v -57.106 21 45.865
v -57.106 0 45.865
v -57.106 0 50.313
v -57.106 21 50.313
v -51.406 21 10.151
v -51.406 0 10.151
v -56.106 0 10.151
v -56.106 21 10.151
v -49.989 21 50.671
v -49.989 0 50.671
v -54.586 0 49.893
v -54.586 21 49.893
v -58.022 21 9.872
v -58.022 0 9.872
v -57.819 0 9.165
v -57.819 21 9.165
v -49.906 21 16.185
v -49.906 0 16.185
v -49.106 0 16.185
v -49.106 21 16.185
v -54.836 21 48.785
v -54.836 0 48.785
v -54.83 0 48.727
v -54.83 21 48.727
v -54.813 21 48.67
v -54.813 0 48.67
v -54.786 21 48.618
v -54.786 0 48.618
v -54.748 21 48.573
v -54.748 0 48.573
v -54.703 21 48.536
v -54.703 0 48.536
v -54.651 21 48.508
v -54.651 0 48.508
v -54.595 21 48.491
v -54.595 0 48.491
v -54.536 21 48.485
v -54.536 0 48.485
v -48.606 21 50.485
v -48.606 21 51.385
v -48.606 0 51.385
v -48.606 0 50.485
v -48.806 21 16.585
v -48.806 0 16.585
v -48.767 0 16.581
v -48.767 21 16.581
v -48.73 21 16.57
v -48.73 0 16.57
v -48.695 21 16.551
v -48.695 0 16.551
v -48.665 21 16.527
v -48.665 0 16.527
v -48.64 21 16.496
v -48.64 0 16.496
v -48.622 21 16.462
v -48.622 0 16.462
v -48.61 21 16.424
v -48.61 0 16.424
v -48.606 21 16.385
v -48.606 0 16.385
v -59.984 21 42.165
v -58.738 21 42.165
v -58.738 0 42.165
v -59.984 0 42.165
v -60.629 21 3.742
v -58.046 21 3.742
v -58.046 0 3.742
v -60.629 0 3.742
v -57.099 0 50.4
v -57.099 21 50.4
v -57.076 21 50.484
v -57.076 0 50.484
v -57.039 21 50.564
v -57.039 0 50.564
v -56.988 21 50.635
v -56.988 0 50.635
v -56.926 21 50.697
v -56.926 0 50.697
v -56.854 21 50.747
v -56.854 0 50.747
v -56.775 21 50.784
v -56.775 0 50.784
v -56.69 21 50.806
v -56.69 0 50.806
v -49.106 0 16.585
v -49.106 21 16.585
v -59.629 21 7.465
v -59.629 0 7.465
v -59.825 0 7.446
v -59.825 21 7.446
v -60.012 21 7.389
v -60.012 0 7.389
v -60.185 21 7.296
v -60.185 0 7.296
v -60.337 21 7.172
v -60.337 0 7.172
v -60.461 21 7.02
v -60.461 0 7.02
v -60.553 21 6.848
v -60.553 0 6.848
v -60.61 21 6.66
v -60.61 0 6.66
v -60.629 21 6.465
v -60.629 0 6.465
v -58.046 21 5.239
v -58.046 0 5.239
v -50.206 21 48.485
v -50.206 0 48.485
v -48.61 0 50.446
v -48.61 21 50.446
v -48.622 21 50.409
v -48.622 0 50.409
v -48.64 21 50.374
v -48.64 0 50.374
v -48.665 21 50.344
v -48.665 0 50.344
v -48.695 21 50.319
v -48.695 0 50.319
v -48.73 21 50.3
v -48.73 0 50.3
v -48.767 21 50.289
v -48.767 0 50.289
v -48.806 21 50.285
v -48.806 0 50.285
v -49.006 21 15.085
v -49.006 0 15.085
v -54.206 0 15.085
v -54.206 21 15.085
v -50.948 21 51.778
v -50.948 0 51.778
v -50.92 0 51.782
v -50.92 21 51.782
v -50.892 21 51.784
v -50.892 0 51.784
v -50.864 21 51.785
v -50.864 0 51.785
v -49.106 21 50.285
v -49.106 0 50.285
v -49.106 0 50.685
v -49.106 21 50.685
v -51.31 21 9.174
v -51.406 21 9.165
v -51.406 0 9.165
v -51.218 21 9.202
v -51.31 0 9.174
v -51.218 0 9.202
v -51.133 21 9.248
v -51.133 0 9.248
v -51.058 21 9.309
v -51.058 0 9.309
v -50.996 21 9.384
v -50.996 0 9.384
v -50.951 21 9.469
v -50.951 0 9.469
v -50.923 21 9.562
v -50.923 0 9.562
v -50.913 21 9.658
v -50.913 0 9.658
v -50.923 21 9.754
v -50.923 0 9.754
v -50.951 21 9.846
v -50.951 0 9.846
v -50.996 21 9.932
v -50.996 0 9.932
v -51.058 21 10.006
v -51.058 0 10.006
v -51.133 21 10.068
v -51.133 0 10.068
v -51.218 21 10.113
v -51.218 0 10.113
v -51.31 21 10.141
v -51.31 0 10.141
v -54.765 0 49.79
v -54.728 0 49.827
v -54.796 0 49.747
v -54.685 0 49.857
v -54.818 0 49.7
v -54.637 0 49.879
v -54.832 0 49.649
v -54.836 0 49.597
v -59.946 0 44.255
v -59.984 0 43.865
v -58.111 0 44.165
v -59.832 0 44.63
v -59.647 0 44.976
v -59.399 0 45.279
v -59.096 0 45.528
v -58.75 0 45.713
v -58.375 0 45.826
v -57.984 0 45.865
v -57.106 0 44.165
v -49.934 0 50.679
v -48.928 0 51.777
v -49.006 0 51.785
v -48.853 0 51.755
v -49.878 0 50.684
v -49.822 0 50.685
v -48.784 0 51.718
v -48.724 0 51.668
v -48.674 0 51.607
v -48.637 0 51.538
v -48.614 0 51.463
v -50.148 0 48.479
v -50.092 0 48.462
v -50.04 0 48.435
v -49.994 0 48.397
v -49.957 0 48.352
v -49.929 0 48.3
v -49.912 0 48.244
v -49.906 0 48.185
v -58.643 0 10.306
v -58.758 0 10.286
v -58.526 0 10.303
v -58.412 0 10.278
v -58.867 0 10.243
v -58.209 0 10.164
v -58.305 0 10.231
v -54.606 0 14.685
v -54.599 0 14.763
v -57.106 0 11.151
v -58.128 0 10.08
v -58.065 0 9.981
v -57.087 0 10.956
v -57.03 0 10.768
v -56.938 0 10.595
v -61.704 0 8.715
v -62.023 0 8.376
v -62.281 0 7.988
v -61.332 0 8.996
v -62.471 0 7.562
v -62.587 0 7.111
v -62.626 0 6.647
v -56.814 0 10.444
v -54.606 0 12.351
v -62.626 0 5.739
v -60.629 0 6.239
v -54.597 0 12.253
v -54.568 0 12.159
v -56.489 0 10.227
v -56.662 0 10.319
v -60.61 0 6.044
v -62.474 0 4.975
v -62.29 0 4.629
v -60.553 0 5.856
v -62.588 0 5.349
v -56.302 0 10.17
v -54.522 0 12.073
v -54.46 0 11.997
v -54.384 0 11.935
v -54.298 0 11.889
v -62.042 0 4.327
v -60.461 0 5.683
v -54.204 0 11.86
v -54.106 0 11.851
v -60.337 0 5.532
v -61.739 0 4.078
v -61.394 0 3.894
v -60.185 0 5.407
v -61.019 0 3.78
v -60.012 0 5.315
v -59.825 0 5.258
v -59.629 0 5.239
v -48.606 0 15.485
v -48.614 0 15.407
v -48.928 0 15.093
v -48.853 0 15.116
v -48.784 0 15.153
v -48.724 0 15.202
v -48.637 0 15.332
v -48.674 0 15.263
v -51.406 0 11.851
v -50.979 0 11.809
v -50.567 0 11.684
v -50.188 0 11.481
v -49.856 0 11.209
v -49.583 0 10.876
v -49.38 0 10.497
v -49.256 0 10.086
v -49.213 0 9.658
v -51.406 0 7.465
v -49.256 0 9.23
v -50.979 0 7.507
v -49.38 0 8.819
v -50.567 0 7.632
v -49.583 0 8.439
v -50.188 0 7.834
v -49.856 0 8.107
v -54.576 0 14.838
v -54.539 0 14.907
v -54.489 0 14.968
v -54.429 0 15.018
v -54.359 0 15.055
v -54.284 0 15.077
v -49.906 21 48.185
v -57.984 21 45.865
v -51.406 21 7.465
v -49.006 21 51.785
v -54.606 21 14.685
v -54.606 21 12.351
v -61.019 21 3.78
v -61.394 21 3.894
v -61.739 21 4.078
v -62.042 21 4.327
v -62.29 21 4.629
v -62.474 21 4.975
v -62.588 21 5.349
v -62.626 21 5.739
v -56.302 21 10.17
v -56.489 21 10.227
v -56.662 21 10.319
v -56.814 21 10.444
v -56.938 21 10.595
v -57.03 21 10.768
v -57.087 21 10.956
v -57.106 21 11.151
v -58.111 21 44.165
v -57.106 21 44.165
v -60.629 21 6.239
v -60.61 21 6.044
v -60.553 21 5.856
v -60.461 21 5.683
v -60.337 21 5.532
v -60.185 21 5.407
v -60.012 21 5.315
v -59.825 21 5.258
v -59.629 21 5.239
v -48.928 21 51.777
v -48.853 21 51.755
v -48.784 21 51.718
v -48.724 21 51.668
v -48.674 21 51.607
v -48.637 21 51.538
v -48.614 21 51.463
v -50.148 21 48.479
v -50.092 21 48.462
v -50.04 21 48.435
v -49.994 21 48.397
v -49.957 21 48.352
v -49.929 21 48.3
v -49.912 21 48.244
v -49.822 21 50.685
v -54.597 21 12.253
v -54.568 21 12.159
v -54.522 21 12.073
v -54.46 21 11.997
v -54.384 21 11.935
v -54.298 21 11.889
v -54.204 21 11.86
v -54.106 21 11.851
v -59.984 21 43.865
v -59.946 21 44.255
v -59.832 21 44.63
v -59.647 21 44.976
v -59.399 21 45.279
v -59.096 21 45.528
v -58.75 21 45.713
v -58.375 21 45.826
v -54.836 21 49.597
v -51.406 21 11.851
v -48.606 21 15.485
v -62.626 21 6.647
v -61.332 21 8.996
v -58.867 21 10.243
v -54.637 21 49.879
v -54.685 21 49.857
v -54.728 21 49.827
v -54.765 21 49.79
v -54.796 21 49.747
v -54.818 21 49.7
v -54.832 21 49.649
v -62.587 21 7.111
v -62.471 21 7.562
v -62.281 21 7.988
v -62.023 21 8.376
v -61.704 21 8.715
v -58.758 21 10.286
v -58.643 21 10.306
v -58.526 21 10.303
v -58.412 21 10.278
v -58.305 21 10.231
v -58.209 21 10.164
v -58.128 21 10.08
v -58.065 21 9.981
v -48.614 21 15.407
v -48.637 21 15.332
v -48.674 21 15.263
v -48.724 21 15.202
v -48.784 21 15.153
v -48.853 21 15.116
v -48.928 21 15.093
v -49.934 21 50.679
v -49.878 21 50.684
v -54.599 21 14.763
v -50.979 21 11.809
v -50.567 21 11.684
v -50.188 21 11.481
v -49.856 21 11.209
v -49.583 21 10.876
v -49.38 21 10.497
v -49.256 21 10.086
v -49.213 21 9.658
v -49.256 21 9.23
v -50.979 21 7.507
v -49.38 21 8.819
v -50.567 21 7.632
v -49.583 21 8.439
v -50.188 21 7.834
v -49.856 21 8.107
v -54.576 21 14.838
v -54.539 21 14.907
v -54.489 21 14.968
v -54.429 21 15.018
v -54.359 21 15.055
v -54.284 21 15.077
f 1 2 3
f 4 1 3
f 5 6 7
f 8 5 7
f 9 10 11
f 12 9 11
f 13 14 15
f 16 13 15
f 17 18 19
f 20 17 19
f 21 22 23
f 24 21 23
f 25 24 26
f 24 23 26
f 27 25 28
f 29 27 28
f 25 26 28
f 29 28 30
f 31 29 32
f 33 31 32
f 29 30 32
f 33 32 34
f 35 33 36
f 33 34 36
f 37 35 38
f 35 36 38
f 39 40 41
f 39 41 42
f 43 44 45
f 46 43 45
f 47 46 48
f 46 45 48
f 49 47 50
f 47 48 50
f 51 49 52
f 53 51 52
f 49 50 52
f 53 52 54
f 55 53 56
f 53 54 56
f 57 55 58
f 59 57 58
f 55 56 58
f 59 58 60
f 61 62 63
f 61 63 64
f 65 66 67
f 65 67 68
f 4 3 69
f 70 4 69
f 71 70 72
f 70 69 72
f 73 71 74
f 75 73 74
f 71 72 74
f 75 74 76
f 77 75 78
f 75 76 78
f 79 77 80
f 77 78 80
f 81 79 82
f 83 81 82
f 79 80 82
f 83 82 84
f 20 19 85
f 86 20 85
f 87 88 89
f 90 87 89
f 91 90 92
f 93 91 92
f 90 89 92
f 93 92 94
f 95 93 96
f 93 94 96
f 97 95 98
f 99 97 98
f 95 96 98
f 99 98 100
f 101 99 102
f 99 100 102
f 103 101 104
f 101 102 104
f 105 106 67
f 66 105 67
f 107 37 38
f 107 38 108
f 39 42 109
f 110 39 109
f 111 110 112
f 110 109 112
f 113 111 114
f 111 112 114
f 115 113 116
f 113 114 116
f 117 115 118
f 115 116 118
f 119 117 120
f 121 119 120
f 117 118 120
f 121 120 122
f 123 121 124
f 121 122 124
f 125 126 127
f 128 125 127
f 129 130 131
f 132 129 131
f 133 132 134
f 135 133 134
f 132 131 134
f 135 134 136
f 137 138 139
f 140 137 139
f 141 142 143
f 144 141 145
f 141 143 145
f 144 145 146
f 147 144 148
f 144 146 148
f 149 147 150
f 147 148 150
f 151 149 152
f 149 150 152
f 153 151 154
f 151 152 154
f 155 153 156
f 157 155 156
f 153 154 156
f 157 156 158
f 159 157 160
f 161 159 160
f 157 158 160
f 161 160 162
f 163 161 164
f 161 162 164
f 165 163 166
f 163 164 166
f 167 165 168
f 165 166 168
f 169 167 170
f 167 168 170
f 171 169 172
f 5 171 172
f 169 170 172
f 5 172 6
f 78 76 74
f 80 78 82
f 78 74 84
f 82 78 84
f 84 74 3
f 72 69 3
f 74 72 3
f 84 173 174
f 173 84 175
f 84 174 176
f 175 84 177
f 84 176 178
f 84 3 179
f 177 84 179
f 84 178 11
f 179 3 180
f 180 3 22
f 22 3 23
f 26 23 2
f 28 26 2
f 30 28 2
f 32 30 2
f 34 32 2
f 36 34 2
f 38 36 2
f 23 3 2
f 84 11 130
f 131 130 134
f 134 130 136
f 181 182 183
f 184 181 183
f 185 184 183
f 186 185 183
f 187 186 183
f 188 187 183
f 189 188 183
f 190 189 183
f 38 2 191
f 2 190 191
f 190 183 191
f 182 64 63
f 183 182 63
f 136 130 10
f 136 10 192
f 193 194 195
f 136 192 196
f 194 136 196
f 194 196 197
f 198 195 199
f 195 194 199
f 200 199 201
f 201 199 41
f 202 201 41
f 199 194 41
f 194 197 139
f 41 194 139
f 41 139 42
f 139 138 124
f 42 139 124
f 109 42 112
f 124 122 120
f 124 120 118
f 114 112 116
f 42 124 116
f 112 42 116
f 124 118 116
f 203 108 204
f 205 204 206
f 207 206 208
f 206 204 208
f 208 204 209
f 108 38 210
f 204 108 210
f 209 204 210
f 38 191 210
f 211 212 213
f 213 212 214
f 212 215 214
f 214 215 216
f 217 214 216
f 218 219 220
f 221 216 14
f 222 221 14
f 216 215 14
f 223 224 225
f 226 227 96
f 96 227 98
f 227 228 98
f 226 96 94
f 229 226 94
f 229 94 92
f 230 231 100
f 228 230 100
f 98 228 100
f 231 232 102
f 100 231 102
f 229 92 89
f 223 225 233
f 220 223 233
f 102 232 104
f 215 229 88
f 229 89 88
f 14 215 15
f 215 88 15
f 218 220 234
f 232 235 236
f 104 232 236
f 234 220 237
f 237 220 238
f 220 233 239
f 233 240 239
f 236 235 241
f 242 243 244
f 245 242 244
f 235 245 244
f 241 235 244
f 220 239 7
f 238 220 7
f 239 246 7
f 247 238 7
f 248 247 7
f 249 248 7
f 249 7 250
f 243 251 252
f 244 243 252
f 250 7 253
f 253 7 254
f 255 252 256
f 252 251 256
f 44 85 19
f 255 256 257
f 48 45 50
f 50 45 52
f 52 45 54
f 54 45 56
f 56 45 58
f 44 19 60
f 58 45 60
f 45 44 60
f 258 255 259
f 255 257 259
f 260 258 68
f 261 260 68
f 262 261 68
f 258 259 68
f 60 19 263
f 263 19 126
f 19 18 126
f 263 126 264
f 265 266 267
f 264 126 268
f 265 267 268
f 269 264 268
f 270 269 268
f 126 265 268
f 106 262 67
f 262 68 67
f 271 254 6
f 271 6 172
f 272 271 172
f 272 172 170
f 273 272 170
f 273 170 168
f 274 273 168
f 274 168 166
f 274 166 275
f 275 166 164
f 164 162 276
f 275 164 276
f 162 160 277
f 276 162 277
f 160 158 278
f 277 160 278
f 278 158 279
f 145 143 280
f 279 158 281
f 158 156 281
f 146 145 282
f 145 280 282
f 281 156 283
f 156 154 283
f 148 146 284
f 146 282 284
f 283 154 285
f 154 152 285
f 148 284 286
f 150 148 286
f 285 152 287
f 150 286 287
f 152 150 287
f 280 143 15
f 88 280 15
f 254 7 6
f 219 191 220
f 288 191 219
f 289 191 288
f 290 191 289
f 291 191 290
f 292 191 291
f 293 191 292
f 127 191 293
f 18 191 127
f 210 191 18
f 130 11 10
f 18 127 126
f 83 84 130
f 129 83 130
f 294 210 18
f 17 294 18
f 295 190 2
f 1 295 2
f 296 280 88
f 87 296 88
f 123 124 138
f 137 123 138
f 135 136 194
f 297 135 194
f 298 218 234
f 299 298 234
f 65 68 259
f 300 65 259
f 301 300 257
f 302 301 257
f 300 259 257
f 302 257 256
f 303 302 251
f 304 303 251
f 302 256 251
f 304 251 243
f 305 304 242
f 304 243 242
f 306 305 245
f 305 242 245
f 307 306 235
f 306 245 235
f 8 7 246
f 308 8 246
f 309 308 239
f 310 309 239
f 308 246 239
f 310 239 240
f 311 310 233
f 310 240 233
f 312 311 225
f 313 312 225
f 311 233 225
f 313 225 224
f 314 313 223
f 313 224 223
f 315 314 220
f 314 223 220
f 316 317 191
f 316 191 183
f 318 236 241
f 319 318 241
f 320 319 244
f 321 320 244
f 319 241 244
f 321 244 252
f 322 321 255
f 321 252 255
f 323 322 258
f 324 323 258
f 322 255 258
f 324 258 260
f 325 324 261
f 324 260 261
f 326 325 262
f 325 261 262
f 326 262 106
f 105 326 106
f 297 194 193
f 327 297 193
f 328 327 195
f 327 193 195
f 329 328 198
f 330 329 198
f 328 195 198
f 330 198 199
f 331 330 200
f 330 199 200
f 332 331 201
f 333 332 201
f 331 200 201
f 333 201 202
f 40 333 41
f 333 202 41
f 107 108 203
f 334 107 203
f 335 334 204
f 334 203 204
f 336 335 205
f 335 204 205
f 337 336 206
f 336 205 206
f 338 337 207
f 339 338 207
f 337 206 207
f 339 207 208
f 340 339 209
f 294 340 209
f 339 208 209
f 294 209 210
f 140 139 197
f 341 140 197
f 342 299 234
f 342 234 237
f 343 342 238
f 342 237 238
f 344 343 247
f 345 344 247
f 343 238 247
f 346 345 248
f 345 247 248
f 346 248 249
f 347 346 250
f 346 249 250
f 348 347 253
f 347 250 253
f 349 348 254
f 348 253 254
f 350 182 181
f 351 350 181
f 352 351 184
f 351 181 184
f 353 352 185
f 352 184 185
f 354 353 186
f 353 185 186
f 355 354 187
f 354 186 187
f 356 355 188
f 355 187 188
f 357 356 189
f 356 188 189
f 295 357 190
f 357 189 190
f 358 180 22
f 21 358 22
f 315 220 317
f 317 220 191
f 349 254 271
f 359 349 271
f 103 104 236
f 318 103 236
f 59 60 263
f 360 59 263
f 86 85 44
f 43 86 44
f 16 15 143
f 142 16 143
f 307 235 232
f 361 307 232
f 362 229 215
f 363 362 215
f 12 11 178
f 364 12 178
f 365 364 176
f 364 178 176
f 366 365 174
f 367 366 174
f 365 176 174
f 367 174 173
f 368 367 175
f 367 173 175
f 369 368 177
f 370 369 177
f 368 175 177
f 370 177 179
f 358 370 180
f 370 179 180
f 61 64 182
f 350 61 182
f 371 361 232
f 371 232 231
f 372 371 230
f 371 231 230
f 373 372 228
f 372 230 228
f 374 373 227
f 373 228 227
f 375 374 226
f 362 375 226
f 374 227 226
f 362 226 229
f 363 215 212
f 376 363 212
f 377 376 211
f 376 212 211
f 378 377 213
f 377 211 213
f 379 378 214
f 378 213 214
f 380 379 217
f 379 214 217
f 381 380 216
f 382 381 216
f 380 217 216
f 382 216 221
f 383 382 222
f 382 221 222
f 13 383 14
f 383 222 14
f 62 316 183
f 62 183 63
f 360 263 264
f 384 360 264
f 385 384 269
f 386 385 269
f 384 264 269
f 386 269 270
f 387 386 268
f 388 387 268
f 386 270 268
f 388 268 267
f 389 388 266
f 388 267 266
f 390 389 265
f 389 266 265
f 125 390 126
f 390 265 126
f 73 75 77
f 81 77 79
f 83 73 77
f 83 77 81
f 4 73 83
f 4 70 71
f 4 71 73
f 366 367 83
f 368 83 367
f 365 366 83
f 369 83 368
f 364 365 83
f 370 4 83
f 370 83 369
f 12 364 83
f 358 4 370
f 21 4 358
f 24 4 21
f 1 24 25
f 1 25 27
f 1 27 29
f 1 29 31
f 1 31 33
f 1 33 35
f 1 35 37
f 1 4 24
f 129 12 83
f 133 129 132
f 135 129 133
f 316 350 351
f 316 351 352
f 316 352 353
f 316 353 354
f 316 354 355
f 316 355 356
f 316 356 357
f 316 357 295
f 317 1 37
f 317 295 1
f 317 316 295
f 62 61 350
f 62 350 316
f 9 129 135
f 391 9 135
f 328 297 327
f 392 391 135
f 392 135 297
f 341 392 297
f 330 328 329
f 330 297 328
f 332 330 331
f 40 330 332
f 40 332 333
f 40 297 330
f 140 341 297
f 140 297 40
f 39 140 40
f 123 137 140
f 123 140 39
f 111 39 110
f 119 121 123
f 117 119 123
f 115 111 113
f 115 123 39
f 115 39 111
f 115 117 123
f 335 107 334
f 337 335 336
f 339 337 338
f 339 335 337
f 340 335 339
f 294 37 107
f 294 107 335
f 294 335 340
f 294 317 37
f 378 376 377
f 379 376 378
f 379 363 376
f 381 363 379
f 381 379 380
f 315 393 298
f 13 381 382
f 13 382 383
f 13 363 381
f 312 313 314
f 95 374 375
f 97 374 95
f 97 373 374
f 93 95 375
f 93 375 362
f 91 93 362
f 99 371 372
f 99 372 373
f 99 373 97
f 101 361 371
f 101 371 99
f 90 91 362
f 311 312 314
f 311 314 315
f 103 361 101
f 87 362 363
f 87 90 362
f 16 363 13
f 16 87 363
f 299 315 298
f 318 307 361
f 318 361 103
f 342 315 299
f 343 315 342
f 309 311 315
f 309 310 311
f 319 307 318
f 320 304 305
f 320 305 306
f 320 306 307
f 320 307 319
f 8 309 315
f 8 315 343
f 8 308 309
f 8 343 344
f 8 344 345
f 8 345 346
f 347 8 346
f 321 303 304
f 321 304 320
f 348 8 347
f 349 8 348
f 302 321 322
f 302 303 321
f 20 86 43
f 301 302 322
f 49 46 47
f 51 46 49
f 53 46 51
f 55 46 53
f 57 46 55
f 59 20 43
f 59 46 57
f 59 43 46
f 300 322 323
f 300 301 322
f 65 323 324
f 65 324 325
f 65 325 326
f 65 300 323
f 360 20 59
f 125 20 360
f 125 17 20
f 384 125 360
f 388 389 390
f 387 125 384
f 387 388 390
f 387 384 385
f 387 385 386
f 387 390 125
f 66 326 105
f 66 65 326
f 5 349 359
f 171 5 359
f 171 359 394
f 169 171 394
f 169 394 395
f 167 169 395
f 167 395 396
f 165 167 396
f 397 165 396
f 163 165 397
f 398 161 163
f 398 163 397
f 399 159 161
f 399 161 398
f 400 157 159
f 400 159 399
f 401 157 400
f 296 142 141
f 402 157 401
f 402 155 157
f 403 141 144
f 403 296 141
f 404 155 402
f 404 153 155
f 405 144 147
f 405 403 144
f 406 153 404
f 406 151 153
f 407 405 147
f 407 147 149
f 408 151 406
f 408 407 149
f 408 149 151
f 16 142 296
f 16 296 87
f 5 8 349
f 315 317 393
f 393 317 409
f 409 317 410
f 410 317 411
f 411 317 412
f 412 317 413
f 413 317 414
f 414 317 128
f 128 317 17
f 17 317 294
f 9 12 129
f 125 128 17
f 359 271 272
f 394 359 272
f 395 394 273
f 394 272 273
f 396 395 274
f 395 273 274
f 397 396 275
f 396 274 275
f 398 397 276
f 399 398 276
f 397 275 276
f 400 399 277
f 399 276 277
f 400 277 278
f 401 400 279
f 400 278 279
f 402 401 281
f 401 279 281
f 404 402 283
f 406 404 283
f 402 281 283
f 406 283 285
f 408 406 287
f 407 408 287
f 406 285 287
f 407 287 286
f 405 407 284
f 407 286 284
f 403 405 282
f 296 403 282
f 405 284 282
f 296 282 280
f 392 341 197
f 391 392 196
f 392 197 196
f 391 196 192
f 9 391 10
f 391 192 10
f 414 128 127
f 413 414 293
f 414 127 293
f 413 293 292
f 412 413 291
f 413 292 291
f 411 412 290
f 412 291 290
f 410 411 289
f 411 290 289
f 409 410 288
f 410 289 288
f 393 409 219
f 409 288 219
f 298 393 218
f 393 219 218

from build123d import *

# Parameters (mm, degrees)
BOSS_EXTRUDE2_DEPTH = 21


with BuildPart() as part:
    # Sketch1 → Boss-Extrude2 (new body)
    with BuildSketch(Plane(origin=(0, 0, 0), x_dir=(1, 0, 0), z_dir=(0, 1, 0))):
        with BuildLine():
            Line((-57.106413622, -7.464824426), (-59.629413704, -7.464824426))
            ThreePointArc((-59.629413704, -7.464824426), (-60.336520485, -7.171931207), (-60.629413704, -6.464824426))
            Line((-60.629413704, -6.464824426), (-60.629413704, -6.238826501))
            ThreePointArc((-60.629413704, -6.238826501), (-60.336520485, -5.53171972), (-59.629413704, -5.238826501))
            Line((-59.629413704, -5.238826501), (-58.046413759, -5.238826501))
            Line((-58.046413759, -5.238826501), (-58.046413759, -3.741824854))
            Line((-58.046413759, -3.741824854), (-60.629413704, -3.741824854))
            ThreePointArc((-60.629413704, -3.741824854), (-62.041505931, -4.326732605), (-62.626413683, -5.738824833))
            Line((-62.626413683, -5.738824833), (-62.626413683, -6.646827448))
            ThreePointArc((-62.626413683, -6.646827448), (-62.281482952, -7.988034096), (-61.33228598, -8.996417749))
            Line((-61.33228598, -8.996417749), (-58.867053131, -10.243427026))
            ThreePointArc((-58.867053131, -10.243427026), (-58.356925281, -10.257239692), (-58.022202829, -9.87203573))
            Line((-58.022202829, -9.87203573), (-57.819413522, -9.164825189))
            Line((-57.819413522, -9.164825189), (-51.406413416, -9.164825189))
            ThreePointArc((-51.406413416, -9.164825189), (-50.913413385, -9.65782522), (-51.406413416, -10.15082525))
            Line((-51.406413416, -10.15082525), (-56.106413702, -10.15082525))
            ThreePointArc((-56.106413702, -10.15082525), (-56.813520483, -10.443718469), (-57.106413702, -11.15082525))
            Line((-57.106413702, -11.15082525), (-57.106413702, -44.164825666))
            Line((-57.106413702, -44.164825666), (-58.111413816, -44.164825666))
            Line((-58.111413816, -44.164825666), (-58.738413671, -42.164826143))
            Line((-58.738413671, -42.164826143), (-59.984413723, -42.164826143))
            Line((-59.984413723, -42.164826143), (-59.984413723, -43.864825714))
            ThreePointArc((-59.984413723, -43.864825714), (-59.398627215, -45.279039445), (-57.984413484, -45.864825952))
            Line((-57.984413484, -45.864825952), (-57.106413702, -45.864825952))
            Line((-57.106413702, -45.864825952), (-57.106413702, -50.312660842))
            ThreePointArc((-57.106413702, -50.312660842), (-56.988345829, -50.635349314), (-56.6899023, -50.805641221))
            Line((-56.6899023, -50.805641221), (-50.947861868, -51.77808339))
            ThreePointArc((-50.947861868, -51.77808339), (-50.906264859, -51.783345015), (-50.864373269, -51.785103011))
            Line((-50.864373269, -51.785103011), (-49.006412669, -51.785103011))
            ThreePointArc((-49.006412669, -51.785103011), (-48.723569957, -51.667945724), (-48.606412669, -51.385103011))
            Line((-48.606412669, -51.385103011), (-48.606412669, -50.485103011))
            ThreePointArc((-48.606412669, -50.485103011), (-48.664991313, -50.343681655), (-48.806412669, -50.285103011))
            Line((-48.806412669, -50.285103011), (-49.106412669, -50.285103011))
            Line((-49.106412669, -50.285103011), (-49.106412669, -50.685103011))
            Line((-49.106412669, -50.685103011), (-49.822333869, -50.685103011))
            ThreePointArc((-49.822333869, -50.685103011), (-49.906117049, -50.68158702), (-49.989311067, -50.671063769))
            Line((-49.989311067, -50.671063769), (-54.586309617, -49.892539951))
            ThreePointArc((-54.586309617, -49.892539951), (-54.765375734, -49.790364807), (-54.836216458, -49.596751723))
            Line((-54.836216458, -49.596751723), (-54.836216458, -48.785103011))
            ThreePointArc((-54.836216458, -48.785103011), (-54.748348492, -48.572970977), (-54.536216458, -48.485103011))
            Line((-54.536216458, -48.485103011), (-50.206412669, -48.485103011))
            ThreePointArc((-50.206412669, -48.485103011), (-49.994280635, -48.397235046), (-49.906412669, -48.185103011))
            Line((-49.906412669, -48.185103011), (-49.906412669, -16.585103011))
            Line((-49.906412669, -16.585103011), (-49.906412669, -16.185103011))
            Line((-49.906412669, -16.185103011), (-49.106412669, -16.185103011))
            Line((-49.106412669, -16.185103011), (-49.106412669, -16.585103011))
            Line((-49.106412669, -16.585103011), (-48.806412669, -16.585103011))
            ThreePointArc((-48.806412669, -16.585103011), (-48.664991313, -16.526524367), (-48.606412669, -16.385103011))
            Line((-48.606412669, -16.385103011), (-48.606412669, -15.485103011))
            ThreePointArc((-48.606412669, -15.485103011), (-48.723569957, -15.202260299), (-49.006412669, -15.085103011))
            Line((-49.006412669, -15.085103011), (-53.806412669, -15.085103011))
            Line((-53.806412669, -15.085103011), (-54.206412669, -15.085103011))
            ThreePointArc((-54.206412669, -15.085103011), (-54.489255382, -14.967945724), (-54.606412669, -14.685103011))
            Line((-54.606412669, -14.685103011), (-54.606412669, -14.585103011))
            Line((-54.606412669, -14.585103011), (-54.606412669, -12.350826013))
            ThreePointArc((-54.606412669, -12.350826013), (-54.45996606, -11.997272623), (-54.106412669, -11.850826013))
            Line((-54.106412669, -11.850826013), (-51.40641286, -11.850826013))
            ThreePointArc((-51.40641286, -11.850826013), (-49.213412067, -9.65782522), (-51.40641286, -7.464824426))
            Line((-51.40641286, -7.464824426), (-54.106412669, -7.464824426))
            Line((-54.106412669, -7.464824426), (-57.106413622, -7.464824426))
        make_face()
    extrude(amount=BOSS_EXTRUDE2_DEPTH)


solid = part.part
